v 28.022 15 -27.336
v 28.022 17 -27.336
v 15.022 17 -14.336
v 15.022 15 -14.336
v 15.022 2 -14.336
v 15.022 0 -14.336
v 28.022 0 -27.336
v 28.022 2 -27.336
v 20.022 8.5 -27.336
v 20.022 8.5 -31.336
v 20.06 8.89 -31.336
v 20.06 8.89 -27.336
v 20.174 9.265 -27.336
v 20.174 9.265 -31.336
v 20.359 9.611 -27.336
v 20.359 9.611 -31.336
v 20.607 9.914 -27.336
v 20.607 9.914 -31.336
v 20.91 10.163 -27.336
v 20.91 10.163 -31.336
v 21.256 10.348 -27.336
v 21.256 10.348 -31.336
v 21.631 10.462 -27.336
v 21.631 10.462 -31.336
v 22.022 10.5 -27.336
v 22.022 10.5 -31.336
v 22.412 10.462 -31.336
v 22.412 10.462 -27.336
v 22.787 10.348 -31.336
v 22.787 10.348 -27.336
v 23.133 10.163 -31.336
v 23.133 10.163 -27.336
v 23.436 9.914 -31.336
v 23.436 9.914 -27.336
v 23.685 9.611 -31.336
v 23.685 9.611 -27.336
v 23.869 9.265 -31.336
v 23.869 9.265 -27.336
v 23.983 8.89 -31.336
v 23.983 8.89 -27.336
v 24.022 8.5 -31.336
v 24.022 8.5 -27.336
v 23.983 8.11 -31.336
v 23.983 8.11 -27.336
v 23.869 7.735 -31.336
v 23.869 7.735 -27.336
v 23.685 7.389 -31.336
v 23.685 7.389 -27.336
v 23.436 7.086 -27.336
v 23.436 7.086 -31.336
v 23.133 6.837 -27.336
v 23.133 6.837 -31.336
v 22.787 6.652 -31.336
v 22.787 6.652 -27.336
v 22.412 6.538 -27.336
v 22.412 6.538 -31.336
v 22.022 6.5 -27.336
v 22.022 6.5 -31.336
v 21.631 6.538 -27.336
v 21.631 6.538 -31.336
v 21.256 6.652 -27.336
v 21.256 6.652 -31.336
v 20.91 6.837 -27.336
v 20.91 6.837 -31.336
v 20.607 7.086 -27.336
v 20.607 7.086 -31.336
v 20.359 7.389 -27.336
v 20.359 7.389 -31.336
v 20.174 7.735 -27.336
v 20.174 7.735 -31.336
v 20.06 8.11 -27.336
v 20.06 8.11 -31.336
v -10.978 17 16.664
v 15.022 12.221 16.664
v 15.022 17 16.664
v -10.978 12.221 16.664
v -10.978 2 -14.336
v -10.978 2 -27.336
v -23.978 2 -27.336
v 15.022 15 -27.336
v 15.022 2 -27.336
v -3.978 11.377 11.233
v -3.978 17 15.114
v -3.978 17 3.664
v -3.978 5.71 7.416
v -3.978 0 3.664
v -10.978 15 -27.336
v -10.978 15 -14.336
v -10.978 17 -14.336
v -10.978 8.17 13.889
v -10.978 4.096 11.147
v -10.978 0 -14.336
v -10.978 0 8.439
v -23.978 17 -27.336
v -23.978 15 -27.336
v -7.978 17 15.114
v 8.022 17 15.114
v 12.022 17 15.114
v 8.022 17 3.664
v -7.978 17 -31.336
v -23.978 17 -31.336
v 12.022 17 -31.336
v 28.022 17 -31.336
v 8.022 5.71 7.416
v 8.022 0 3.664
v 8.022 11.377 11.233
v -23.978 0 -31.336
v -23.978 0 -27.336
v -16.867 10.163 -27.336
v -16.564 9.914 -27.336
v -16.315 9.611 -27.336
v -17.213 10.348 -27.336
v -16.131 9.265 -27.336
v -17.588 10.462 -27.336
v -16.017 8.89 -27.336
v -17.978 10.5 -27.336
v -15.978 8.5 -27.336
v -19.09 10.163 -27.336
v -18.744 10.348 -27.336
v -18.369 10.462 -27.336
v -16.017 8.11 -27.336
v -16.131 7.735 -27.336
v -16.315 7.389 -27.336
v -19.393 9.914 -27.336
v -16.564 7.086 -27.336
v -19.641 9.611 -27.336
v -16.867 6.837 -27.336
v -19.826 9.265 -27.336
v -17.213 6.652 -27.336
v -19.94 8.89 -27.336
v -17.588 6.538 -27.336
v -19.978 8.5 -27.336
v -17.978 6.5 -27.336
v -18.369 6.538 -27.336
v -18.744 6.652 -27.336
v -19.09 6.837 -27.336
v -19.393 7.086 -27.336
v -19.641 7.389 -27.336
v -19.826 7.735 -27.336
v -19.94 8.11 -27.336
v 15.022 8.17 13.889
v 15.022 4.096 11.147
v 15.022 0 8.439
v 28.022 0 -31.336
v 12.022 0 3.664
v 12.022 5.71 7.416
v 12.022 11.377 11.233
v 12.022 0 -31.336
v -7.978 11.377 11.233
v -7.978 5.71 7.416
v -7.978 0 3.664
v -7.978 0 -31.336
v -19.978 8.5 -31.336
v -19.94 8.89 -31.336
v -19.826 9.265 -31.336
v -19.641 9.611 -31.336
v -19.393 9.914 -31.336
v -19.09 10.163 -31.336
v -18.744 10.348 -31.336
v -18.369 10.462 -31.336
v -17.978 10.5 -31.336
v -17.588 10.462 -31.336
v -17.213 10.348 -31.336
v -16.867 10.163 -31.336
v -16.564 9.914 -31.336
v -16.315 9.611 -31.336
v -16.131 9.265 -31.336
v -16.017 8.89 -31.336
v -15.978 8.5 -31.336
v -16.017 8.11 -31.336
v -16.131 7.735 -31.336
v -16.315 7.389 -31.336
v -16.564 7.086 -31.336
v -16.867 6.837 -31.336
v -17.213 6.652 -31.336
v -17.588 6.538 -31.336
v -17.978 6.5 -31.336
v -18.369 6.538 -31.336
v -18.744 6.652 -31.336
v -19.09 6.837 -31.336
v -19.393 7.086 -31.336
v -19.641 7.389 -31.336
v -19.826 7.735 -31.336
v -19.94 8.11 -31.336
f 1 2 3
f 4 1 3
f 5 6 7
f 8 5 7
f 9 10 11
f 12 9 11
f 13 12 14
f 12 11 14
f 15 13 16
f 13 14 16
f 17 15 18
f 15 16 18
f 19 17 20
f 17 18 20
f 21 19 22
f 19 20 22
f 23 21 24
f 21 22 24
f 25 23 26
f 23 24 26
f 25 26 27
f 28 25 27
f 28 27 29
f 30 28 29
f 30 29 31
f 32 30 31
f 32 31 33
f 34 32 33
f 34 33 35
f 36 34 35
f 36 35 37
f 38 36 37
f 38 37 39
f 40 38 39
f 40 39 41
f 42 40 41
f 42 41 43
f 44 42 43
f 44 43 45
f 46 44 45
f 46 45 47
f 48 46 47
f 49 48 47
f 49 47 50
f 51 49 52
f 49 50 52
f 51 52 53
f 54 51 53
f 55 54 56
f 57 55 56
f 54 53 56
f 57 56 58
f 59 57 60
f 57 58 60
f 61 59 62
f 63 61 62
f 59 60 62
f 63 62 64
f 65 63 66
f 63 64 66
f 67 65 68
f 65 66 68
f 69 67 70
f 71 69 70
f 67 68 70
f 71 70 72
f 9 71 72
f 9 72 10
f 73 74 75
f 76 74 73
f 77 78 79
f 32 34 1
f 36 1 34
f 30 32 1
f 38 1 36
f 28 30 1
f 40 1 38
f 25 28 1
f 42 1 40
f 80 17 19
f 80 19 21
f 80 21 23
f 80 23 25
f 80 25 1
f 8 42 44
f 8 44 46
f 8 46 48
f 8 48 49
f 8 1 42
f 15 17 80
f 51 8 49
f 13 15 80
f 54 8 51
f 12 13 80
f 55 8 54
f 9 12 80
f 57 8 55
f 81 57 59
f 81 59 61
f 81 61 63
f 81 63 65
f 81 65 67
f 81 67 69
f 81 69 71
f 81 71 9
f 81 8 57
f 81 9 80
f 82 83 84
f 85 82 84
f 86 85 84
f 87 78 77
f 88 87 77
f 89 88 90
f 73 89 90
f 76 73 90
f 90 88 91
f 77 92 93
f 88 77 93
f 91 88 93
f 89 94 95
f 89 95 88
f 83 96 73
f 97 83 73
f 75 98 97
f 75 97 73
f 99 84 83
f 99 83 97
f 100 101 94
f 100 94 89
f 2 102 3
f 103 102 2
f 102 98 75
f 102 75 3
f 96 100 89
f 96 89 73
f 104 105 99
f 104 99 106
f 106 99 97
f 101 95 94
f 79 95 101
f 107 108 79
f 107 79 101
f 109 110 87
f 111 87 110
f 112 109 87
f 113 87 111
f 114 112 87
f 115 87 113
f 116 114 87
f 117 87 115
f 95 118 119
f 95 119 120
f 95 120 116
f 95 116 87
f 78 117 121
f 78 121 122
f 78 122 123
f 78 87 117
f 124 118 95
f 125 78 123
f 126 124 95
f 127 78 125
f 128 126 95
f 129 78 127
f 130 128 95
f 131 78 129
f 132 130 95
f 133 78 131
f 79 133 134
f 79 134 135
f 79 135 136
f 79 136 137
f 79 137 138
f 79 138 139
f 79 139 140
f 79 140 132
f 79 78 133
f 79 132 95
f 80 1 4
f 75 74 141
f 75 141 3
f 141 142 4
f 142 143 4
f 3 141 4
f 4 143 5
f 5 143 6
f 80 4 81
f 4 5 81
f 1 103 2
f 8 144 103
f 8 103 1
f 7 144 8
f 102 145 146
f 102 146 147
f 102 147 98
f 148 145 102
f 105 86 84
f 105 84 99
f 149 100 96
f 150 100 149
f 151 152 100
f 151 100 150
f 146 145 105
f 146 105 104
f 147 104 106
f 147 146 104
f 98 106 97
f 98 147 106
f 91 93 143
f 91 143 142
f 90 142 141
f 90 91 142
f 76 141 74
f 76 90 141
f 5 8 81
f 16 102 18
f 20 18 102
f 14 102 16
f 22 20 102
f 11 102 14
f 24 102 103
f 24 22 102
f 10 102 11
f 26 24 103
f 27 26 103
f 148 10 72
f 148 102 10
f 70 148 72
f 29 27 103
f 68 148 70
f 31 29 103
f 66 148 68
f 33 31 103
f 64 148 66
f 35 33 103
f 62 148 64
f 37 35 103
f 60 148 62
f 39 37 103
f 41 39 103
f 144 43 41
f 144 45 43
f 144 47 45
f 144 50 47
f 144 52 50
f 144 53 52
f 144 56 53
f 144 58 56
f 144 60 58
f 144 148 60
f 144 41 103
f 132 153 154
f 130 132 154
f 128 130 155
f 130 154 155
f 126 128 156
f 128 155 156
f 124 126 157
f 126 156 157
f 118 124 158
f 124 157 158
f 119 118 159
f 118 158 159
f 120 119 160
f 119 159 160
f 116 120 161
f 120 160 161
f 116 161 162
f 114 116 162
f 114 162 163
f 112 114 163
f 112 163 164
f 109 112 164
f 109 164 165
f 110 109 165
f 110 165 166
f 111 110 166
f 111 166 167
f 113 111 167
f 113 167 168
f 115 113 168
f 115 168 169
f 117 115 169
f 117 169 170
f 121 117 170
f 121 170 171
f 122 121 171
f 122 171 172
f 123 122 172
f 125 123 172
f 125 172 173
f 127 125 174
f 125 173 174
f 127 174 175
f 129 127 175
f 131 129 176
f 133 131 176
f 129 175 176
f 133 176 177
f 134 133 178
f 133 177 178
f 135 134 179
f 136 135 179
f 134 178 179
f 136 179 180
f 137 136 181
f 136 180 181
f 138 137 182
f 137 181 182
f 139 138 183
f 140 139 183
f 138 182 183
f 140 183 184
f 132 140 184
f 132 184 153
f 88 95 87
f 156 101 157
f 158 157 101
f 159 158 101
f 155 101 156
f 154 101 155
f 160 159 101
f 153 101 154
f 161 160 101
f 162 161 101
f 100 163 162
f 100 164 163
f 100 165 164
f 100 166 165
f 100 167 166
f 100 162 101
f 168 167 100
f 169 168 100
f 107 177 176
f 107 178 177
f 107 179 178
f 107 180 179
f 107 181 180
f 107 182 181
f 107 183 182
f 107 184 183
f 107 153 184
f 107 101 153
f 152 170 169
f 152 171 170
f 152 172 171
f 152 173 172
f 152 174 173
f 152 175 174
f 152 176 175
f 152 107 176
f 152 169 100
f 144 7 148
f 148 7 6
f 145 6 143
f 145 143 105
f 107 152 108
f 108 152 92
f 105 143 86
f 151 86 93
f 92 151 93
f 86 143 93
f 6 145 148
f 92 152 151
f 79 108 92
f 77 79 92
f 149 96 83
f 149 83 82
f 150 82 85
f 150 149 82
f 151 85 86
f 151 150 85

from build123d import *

# Parameters (mm, degrees)
BOSS_EXTRUDE1_DEPTH = 17
BOSS_EXTRUDE2_DEPTH = 2
BOSS_EXTRUDE3_DEPTH = 2
SKETCH6_R           = 2
CUT_EXTRUDE1_DEPTH  = 10
CUT_EXTRUDE2_DEPTH  = 4
CUT_EXTRUDE3_DEPTH  = 100
CUT_EXTRUDE4_DEPTH  = 4


with BuildPart() as part:
    # Sketch1 → Boss-Extrude1 (new body)
    with BuildSketch(Plane(origin=(0, 0, 0), x_dir=(1, 0, 0), z_dir=(0, 1, 0))):
        Polygon((-7.978390595, -3.663628582), (12.021609405, -3.663628582), (12.021609405, 31.336371418), (28.021609405, 31.336371418), (28.021609405, 27.336371418), (15.021609405, 27.336371418), (15.021609405, 18.231970095), (15.021609405, -16.663628582), (-10.978390595, -16.663628582), (-10.978390595, 22.152823879), (-10.978390595, 27.336371418), (-23.978390595, 27.336371418), (-23.978390595, 31.336371418), (-7.978390595, 31.336371418), align=None)
    extrude(amount=BOSS_EXTRUDE1_DEPTH)

    # Sketch4 → Boss-Extrude2 (add)
    with BuildSketch(Plane(origin=(0, 17, 0), x_dir=(1, 0, 0), z_dir=(0, 1, 0))):
        Polygon((-23.978390595, 27.336371418), (-10.978390595, 14.336371418), (-10.978390595, 27.336371418), align=None)
        Polygon((28.021609405, 27.336371418), (15.021609405, 14.336371418), (15.021609405, 27.336371418), align=None)
    extrude(amount=-BOSS_EXTRUDE2_DEPTH)

    # Sketch5 → Boss-Extrude3 (add)
    with BuildSketch(Plane.XZ):
        Polygon((-23.978390595, -27.336371418), (-10.978390595, -14.336371418), (-10.978390595, -27.336371418), align=None)
        Polygon((15.021609405, -14.336371418), (28.021609405, -27.336371418), (15.021609405, -27.336371418), align=None)
    extrude(amount=-BOSS_EXTRUDE3_DEPTH)

    # Sketch6 → Cut-Extrude1 (cut)
    with BuildSketch(Plane(origin=(0, 0, -31.336371418), x_dir=(-1, 0, 0), z_dir=(0, 0, -1))):
        with Locations((-22.021609405, 8.5)):
            Circle(SKETCH6_R)
        with Locations((17.978390595, 8.5)):
            Circle(SKETCH6_R)
    extrude(amount=-CUT_EXTRUDE1_DEPTH, mode=Mode.SUBTRACT)

    # Sketch7 → Cut-Extrude2 (cut)
    with BuildSketch(Plane(origin=(-7.978390595, 0, 0), x_dir=(0, 0, -1), z_dir=(1, 0, 0))):
        with BuildLine():
            Line((6.660260068, 17), (-15.113860184, 17))
            ThreePointArc((-15.113860184, 17), (-9.316147205, 8.548897323), (-3.663628582, 0))
            Line((-3.663628582, 0), (9.59929213, 0))
            Line((9.59929213, 0), (6.660260068, 17))
        make_face()
    extrude(amount=CUT_EXTRUDE2_DEPTH, mode=Mode.SUBTRACT)

    # Sketch8 → Cut-Extrude3 (cut)
    with BuildSketch(Plane.ZY.offset(10.978390595)):
        with BuildLine():
            Line((21.615286826, 19.275621448), (46.650832109, 12.975800719))
            Line((46.650832109, 12.975800719), (28.995853608, -26.911994427))
            Line((28.995853608, -26.911994427), (-0.690246805, -14.377221046))
            ThreePointArc((-0.690246805, -14.377221046), (10.177476822, 2.638130465), (21.615286826, 19.275621448))
        make_face()
    extrude(amount=-CUT_EXTRUDE3_DEPTH, mode=Mode.SUBTRACT)

    # Sketch9 → Cut-Extrude4 (cut)
    with BuildSketch(Plane.ZY.offset(-12.021609405)):
        with BuildLine():
            Line((-11.188223811, 17), (-11.188223811, 0))
            Line((-11.188223811, 0), (3.663628582, 0))
            ThreePointArc((3.663628582, 0), (9.316147205, 8.548897323), (15.113860184, 17))
            Line((15.113860184, 17), (-11.188223811, 17))
        make_face()
    extrude(amount=CUT_EXTRUDE4_DEPTH, mode=Mode.SUBTRACT)


solid = part.part
